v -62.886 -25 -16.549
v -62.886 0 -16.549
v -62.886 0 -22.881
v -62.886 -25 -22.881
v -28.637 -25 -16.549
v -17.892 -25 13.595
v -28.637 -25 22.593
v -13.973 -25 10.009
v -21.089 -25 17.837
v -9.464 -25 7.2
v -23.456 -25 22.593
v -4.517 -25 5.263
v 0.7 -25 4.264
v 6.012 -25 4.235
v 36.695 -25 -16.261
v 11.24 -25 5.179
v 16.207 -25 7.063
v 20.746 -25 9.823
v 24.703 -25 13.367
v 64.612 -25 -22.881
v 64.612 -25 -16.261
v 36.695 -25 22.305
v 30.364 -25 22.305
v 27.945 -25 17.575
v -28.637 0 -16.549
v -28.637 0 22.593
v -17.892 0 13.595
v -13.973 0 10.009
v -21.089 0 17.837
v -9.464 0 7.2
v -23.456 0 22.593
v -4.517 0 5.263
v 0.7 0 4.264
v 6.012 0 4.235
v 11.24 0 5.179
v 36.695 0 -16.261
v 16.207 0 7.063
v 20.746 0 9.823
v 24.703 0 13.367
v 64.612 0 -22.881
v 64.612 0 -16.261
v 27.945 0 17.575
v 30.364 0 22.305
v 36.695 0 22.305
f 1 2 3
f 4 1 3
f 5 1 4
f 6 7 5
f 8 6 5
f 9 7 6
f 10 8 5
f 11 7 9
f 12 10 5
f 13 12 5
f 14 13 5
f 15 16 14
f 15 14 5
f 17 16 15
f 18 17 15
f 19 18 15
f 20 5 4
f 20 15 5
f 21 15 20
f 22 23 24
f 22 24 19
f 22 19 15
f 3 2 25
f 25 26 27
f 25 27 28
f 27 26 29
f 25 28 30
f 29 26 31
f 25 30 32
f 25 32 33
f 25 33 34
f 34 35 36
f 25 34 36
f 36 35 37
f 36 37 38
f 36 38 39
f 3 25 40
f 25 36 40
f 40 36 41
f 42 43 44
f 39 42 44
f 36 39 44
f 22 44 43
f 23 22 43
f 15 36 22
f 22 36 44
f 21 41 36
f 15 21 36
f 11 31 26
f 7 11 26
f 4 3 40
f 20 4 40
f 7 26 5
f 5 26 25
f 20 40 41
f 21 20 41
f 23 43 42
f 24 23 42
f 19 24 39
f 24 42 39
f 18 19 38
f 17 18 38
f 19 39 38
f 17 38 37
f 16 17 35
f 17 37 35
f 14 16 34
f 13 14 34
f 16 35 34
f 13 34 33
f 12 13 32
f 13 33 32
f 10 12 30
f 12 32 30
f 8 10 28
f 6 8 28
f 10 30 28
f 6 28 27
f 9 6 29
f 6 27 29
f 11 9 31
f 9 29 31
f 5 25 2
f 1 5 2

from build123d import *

# Parameters (mm, degrees)
F1_DEPTH = 25


with BuildPart() as f1:
    # F0 (on Front) → F1 (new body)
    with BuildSketch(Plane.XZ):
        with BuildLine():
            Line((-28.636673, -16.548831), (-62.88556, -16.548831))
            Line((-62.88556, -16.548831), (-62.88556, -22.880558))
            Line((-62.88556, -22.880558), (64.612396, -22.880558))
            Line((64.612396, -22.880558), (64.612396, -16.261026))
            Line((64.612396, -16.261026), (36.695234, -16.261026))
            Line((36.695234, -16.261026), (36.695234, 22.304947))
            Line((36.695234, 22.304947), (30.363506, 22.304947))
            ThreePointArc((30.363506, 22.304947), (3.355691, 4.127085), (-23.456169, 22.592753))
            Line((-23.456169, 22.592753), (-28.636673, 22.592753))
            Line((-28.636673, 22.592753), (-28.636673, -16.548831))
        make_face()
    extrude(amount=F1_DEPTH)


solid = f1.part
